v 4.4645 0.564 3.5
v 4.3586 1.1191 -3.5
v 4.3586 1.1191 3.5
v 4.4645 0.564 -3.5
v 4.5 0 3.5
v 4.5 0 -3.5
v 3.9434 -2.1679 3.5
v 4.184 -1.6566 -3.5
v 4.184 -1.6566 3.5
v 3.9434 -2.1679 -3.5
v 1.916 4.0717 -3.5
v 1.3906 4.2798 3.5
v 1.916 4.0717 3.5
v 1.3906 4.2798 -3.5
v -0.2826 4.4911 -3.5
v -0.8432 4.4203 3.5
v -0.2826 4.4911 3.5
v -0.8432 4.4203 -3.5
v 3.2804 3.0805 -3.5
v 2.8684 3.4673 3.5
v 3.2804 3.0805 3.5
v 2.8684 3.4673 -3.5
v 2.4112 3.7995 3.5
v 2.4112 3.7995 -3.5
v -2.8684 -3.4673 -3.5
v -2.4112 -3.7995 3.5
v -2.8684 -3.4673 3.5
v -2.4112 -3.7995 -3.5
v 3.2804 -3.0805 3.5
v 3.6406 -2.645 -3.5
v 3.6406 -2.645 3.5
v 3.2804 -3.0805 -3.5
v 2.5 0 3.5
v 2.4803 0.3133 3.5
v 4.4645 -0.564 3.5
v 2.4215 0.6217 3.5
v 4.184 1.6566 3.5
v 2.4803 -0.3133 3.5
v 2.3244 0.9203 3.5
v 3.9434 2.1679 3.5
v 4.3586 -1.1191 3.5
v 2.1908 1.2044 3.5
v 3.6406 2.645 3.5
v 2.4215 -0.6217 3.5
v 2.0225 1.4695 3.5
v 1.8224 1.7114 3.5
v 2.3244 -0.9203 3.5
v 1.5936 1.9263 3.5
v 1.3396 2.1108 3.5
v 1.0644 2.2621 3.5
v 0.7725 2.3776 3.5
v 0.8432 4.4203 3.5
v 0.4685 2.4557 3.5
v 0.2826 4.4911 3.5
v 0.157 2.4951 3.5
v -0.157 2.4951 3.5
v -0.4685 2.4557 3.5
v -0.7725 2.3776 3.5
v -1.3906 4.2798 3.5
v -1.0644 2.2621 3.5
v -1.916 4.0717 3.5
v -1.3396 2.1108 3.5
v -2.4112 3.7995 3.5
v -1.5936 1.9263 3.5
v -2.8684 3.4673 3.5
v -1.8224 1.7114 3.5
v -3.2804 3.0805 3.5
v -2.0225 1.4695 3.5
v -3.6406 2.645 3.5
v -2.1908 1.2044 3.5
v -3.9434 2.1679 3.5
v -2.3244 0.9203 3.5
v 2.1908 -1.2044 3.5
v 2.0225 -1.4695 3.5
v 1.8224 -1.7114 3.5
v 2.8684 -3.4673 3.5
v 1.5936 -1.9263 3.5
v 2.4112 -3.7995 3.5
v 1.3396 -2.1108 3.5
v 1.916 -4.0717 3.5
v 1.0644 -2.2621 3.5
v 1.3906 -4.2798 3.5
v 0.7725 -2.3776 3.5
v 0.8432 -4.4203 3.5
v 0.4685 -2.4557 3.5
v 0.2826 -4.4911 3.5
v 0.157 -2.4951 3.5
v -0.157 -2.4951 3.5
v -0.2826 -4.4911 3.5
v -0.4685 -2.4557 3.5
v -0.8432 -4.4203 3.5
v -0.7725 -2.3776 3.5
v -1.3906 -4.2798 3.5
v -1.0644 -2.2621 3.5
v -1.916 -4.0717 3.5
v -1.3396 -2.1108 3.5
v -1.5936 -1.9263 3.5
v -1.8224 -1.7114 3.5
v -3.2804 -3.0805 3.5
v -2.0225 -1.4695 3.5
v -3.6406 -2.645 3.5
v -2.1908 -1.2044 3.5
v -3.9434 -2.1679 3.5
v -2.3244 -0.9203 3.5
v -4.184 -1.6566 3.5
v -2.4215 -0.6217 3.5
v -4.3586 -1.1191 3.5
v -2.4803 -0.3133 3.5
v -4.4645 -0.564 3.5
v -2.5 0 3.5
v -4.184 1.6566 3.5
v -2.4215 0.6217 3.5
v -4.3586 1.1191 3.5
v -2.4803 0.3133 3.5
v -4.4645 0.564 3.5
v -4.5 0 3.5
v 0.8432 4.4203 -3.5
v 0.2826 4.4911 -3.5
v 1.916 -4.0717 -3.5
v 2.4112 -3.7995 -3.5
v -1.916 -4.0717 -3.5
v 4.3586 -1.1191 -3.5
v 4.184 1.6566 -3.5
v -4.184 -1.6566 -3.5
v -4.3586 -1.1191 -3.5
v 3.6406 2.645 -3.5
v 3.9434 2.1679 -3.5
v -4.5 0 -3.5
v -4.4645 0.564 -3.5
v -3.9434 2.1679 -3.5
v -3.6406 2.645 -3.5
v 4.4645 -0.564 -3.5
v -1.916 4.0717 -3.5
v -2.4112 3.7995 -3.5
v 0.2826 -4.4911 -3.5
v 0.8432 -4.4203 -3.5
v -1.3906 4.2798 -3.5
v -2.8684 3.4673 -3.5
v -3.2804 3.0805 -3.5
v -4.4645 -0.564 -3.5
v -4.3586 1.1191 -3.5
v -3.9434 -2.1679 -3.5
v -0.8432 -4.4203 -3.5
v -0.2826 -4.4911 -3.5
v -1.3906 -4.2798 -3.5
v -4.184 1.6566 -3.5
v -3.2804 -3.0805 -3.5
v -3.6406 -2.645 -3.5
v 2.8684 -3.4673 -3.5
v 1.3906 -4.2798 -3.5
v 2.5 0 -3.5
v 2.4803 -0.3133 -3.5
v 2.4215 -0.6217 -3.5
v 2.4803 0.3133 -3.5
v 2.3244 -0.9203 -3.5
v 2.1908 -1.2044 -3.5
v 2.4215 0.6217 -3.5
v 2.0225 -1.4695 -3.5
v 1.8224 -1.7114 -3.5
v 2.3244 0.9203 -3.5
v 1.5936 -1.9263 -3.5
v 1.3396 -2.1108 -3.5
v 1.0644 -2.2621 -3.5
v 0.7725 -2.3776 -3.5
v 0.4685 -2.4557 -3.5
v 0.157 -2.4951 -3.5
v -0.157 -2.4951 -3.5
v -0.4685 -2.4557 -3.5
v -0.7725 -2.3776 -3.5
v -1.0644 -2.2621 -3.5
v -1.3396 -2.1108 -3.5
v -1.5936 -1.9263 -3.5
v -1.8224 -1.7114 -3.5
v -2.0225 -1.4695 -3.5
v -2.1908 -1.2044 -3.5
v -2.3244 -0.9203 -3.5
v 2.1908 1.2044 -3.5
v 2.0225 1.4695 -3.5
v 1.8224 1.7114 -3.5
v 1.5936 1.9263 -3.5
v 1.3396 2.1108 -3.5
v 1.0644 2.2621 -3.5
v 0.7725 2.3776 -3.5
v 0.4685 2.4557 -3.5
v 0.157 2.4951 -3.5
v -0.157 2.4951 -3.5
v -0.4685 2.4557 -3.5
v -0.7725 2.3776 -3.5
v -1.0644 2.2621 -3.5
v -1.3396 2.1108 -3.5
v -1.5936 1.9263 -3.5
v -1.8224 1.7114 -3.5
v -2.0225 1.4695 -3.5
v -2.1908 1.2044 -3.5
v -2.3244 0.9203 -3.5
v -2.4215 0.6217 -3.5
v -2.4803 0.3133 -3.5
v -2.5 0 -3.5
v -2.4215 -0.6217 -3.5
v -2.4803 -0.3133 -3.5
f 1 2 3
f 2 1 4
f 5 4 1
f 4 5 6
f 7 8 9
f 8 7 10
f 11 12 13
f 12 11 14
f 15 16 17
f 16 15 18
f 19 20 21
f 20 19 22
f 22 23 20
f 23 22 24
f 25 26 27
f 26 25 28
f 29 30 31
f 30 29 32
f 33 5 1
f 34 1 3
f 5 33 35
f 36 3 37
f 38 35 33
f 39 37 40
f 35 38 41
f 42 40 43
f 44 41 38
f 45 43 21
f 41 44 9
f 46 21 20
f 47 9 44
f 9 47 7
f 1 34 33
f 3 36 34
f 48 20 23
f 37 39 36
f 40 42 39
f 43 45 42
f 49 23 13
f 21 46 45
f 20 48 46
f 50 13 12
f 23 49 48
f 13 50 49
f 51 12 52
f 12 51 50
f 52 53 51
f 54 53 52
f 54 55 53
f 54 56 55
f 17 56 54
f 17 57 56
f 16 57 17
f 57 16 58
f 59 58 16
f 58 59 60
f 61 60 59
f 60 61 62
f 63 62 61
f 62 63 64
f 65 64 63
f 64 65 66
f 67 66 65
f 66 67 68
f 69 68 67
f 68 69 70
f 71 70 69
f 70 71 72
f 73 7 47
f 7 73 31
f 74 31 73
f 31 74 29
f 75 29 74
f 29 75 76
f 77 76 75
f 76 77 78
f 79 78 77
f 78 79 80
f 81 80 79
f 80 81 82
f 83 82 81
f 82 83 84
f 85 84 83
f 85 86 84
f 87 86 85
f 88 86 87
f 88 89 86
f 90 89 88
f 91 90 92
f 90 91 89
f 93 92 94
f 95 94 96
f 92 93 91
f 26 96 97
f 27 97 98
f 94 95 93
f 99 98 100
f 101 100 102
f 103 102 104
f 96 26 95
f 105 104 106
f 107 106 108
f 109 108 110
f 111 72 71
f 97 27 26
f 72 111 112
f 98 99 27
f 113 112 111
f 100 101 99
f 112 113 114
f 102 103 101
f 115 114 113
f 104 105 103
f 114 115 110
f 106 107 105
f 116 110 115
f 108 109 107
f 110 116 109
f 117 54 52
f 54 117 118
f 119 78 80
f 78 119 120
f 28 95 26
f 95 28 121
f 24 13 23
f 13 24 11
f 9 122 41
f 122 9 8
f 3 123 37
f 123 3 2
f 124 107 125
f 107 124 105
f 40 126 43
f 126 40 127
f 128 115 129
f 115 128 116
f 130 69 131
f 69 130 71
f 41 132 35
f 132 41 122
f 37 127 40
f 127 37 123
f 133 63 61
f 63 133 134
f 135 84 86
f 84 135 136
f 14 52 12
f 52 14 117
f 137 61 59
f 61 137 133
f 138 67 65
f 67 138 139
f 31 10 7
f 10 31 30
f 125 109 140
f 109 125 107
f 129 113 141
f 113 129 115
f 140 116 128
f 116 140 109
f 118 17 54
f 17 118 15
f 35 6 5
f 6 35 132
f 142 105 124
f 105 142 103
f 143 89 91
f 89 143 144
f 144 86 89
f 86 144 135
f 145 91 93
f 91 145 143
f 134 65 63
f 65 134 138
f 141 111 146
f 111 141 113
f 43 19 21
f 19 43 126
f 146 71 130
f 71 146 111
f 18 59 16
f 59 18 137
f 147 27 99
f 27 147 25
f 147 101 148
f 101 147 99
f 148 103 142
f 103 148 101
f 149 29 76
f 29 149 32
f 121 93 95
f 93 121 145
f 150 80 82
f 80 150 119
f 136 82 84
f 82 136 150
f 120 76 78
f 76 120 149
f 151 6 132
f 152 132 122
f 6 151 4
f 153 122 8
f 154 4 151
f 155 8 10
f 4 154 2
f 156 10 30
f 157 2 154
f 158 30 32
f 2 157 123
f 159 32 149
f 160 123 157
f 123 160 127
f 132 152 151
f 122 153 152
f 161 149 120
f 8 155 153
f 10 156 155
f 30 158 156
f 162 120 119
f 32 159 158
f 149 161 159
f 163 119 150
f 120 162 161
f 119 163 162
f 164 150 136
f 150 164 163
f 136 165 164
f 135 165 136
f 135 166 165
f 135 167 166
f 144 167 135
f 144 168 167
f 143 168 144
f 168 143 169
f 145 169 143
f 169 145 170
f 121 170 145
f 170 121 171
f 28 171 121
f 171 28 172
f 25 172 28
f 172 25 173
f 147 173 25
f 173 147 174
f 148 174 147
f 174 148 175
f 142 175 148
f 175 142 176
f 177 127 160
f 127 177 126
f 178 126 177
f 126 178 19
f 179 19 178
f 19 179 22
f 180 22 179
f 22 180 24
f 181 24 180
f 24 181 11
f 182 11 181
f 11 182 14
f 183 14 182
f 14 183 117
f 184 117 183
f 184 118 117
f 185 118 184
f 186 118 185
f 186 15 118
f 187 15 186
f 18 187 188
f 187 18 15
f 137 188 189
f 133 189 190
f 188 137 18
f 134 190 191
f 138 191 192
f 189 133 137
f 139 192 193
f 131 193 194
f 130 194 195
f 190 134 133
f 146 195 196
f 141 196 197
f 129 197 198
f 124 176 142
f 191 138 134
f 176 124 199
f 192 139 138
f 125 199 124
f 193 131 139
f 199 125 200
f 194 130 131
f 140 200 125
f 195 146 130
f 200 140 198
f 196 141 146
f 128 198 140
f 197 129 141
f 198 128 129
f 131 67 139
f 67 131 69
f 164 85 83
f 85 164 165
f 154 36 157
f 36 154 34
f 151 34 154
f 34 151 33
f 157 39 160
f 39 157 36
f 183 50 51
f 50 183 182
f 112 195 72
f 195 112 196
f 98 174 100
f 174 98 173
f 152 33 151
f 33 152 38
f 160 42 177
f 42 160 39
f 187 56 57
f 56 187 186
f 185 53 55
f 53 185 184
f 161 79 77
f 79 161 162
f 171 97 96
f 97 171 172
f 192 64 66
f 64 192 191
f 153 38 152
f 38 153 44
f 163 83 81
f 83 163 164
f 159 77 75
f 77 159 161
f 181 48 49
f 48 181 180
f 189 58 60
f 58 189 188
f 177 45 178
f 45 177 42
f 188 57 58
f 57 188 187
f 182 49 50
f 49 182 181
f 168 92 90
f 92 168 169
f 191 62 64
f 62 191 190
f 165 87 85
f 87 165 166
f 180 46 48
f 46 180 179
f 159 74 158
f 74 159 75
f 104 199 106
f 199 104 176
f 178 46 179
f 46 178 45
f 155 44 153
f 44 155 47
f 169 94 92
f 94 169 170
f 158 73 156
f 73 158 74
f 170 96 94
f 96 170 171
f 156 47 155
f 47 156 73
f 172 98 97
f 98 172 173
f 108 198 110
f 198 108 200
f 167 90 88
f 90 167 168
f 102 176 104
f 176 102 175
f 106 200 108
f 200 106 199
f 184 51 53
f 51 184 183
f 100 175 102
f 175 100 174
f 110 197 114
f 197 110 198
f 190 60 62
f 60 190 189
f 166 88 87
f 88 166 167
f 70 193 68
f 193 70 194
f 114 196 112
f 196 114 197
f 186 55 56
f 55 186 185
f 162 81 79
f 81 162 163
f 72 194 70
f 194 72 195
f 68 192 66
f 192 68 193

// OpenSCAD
$fn = 50;


difference() {
	union() {
		translate(v = [0, 0, -3.5000000000]) {
			cylinder(h = 7, r = 4.5000000000);
		}
	}
	union() {
		translate(v = [0, 0, -100.0000000000]) {
			cylinder(h = 200, r = 2.5000000000);
		}
	}
}
